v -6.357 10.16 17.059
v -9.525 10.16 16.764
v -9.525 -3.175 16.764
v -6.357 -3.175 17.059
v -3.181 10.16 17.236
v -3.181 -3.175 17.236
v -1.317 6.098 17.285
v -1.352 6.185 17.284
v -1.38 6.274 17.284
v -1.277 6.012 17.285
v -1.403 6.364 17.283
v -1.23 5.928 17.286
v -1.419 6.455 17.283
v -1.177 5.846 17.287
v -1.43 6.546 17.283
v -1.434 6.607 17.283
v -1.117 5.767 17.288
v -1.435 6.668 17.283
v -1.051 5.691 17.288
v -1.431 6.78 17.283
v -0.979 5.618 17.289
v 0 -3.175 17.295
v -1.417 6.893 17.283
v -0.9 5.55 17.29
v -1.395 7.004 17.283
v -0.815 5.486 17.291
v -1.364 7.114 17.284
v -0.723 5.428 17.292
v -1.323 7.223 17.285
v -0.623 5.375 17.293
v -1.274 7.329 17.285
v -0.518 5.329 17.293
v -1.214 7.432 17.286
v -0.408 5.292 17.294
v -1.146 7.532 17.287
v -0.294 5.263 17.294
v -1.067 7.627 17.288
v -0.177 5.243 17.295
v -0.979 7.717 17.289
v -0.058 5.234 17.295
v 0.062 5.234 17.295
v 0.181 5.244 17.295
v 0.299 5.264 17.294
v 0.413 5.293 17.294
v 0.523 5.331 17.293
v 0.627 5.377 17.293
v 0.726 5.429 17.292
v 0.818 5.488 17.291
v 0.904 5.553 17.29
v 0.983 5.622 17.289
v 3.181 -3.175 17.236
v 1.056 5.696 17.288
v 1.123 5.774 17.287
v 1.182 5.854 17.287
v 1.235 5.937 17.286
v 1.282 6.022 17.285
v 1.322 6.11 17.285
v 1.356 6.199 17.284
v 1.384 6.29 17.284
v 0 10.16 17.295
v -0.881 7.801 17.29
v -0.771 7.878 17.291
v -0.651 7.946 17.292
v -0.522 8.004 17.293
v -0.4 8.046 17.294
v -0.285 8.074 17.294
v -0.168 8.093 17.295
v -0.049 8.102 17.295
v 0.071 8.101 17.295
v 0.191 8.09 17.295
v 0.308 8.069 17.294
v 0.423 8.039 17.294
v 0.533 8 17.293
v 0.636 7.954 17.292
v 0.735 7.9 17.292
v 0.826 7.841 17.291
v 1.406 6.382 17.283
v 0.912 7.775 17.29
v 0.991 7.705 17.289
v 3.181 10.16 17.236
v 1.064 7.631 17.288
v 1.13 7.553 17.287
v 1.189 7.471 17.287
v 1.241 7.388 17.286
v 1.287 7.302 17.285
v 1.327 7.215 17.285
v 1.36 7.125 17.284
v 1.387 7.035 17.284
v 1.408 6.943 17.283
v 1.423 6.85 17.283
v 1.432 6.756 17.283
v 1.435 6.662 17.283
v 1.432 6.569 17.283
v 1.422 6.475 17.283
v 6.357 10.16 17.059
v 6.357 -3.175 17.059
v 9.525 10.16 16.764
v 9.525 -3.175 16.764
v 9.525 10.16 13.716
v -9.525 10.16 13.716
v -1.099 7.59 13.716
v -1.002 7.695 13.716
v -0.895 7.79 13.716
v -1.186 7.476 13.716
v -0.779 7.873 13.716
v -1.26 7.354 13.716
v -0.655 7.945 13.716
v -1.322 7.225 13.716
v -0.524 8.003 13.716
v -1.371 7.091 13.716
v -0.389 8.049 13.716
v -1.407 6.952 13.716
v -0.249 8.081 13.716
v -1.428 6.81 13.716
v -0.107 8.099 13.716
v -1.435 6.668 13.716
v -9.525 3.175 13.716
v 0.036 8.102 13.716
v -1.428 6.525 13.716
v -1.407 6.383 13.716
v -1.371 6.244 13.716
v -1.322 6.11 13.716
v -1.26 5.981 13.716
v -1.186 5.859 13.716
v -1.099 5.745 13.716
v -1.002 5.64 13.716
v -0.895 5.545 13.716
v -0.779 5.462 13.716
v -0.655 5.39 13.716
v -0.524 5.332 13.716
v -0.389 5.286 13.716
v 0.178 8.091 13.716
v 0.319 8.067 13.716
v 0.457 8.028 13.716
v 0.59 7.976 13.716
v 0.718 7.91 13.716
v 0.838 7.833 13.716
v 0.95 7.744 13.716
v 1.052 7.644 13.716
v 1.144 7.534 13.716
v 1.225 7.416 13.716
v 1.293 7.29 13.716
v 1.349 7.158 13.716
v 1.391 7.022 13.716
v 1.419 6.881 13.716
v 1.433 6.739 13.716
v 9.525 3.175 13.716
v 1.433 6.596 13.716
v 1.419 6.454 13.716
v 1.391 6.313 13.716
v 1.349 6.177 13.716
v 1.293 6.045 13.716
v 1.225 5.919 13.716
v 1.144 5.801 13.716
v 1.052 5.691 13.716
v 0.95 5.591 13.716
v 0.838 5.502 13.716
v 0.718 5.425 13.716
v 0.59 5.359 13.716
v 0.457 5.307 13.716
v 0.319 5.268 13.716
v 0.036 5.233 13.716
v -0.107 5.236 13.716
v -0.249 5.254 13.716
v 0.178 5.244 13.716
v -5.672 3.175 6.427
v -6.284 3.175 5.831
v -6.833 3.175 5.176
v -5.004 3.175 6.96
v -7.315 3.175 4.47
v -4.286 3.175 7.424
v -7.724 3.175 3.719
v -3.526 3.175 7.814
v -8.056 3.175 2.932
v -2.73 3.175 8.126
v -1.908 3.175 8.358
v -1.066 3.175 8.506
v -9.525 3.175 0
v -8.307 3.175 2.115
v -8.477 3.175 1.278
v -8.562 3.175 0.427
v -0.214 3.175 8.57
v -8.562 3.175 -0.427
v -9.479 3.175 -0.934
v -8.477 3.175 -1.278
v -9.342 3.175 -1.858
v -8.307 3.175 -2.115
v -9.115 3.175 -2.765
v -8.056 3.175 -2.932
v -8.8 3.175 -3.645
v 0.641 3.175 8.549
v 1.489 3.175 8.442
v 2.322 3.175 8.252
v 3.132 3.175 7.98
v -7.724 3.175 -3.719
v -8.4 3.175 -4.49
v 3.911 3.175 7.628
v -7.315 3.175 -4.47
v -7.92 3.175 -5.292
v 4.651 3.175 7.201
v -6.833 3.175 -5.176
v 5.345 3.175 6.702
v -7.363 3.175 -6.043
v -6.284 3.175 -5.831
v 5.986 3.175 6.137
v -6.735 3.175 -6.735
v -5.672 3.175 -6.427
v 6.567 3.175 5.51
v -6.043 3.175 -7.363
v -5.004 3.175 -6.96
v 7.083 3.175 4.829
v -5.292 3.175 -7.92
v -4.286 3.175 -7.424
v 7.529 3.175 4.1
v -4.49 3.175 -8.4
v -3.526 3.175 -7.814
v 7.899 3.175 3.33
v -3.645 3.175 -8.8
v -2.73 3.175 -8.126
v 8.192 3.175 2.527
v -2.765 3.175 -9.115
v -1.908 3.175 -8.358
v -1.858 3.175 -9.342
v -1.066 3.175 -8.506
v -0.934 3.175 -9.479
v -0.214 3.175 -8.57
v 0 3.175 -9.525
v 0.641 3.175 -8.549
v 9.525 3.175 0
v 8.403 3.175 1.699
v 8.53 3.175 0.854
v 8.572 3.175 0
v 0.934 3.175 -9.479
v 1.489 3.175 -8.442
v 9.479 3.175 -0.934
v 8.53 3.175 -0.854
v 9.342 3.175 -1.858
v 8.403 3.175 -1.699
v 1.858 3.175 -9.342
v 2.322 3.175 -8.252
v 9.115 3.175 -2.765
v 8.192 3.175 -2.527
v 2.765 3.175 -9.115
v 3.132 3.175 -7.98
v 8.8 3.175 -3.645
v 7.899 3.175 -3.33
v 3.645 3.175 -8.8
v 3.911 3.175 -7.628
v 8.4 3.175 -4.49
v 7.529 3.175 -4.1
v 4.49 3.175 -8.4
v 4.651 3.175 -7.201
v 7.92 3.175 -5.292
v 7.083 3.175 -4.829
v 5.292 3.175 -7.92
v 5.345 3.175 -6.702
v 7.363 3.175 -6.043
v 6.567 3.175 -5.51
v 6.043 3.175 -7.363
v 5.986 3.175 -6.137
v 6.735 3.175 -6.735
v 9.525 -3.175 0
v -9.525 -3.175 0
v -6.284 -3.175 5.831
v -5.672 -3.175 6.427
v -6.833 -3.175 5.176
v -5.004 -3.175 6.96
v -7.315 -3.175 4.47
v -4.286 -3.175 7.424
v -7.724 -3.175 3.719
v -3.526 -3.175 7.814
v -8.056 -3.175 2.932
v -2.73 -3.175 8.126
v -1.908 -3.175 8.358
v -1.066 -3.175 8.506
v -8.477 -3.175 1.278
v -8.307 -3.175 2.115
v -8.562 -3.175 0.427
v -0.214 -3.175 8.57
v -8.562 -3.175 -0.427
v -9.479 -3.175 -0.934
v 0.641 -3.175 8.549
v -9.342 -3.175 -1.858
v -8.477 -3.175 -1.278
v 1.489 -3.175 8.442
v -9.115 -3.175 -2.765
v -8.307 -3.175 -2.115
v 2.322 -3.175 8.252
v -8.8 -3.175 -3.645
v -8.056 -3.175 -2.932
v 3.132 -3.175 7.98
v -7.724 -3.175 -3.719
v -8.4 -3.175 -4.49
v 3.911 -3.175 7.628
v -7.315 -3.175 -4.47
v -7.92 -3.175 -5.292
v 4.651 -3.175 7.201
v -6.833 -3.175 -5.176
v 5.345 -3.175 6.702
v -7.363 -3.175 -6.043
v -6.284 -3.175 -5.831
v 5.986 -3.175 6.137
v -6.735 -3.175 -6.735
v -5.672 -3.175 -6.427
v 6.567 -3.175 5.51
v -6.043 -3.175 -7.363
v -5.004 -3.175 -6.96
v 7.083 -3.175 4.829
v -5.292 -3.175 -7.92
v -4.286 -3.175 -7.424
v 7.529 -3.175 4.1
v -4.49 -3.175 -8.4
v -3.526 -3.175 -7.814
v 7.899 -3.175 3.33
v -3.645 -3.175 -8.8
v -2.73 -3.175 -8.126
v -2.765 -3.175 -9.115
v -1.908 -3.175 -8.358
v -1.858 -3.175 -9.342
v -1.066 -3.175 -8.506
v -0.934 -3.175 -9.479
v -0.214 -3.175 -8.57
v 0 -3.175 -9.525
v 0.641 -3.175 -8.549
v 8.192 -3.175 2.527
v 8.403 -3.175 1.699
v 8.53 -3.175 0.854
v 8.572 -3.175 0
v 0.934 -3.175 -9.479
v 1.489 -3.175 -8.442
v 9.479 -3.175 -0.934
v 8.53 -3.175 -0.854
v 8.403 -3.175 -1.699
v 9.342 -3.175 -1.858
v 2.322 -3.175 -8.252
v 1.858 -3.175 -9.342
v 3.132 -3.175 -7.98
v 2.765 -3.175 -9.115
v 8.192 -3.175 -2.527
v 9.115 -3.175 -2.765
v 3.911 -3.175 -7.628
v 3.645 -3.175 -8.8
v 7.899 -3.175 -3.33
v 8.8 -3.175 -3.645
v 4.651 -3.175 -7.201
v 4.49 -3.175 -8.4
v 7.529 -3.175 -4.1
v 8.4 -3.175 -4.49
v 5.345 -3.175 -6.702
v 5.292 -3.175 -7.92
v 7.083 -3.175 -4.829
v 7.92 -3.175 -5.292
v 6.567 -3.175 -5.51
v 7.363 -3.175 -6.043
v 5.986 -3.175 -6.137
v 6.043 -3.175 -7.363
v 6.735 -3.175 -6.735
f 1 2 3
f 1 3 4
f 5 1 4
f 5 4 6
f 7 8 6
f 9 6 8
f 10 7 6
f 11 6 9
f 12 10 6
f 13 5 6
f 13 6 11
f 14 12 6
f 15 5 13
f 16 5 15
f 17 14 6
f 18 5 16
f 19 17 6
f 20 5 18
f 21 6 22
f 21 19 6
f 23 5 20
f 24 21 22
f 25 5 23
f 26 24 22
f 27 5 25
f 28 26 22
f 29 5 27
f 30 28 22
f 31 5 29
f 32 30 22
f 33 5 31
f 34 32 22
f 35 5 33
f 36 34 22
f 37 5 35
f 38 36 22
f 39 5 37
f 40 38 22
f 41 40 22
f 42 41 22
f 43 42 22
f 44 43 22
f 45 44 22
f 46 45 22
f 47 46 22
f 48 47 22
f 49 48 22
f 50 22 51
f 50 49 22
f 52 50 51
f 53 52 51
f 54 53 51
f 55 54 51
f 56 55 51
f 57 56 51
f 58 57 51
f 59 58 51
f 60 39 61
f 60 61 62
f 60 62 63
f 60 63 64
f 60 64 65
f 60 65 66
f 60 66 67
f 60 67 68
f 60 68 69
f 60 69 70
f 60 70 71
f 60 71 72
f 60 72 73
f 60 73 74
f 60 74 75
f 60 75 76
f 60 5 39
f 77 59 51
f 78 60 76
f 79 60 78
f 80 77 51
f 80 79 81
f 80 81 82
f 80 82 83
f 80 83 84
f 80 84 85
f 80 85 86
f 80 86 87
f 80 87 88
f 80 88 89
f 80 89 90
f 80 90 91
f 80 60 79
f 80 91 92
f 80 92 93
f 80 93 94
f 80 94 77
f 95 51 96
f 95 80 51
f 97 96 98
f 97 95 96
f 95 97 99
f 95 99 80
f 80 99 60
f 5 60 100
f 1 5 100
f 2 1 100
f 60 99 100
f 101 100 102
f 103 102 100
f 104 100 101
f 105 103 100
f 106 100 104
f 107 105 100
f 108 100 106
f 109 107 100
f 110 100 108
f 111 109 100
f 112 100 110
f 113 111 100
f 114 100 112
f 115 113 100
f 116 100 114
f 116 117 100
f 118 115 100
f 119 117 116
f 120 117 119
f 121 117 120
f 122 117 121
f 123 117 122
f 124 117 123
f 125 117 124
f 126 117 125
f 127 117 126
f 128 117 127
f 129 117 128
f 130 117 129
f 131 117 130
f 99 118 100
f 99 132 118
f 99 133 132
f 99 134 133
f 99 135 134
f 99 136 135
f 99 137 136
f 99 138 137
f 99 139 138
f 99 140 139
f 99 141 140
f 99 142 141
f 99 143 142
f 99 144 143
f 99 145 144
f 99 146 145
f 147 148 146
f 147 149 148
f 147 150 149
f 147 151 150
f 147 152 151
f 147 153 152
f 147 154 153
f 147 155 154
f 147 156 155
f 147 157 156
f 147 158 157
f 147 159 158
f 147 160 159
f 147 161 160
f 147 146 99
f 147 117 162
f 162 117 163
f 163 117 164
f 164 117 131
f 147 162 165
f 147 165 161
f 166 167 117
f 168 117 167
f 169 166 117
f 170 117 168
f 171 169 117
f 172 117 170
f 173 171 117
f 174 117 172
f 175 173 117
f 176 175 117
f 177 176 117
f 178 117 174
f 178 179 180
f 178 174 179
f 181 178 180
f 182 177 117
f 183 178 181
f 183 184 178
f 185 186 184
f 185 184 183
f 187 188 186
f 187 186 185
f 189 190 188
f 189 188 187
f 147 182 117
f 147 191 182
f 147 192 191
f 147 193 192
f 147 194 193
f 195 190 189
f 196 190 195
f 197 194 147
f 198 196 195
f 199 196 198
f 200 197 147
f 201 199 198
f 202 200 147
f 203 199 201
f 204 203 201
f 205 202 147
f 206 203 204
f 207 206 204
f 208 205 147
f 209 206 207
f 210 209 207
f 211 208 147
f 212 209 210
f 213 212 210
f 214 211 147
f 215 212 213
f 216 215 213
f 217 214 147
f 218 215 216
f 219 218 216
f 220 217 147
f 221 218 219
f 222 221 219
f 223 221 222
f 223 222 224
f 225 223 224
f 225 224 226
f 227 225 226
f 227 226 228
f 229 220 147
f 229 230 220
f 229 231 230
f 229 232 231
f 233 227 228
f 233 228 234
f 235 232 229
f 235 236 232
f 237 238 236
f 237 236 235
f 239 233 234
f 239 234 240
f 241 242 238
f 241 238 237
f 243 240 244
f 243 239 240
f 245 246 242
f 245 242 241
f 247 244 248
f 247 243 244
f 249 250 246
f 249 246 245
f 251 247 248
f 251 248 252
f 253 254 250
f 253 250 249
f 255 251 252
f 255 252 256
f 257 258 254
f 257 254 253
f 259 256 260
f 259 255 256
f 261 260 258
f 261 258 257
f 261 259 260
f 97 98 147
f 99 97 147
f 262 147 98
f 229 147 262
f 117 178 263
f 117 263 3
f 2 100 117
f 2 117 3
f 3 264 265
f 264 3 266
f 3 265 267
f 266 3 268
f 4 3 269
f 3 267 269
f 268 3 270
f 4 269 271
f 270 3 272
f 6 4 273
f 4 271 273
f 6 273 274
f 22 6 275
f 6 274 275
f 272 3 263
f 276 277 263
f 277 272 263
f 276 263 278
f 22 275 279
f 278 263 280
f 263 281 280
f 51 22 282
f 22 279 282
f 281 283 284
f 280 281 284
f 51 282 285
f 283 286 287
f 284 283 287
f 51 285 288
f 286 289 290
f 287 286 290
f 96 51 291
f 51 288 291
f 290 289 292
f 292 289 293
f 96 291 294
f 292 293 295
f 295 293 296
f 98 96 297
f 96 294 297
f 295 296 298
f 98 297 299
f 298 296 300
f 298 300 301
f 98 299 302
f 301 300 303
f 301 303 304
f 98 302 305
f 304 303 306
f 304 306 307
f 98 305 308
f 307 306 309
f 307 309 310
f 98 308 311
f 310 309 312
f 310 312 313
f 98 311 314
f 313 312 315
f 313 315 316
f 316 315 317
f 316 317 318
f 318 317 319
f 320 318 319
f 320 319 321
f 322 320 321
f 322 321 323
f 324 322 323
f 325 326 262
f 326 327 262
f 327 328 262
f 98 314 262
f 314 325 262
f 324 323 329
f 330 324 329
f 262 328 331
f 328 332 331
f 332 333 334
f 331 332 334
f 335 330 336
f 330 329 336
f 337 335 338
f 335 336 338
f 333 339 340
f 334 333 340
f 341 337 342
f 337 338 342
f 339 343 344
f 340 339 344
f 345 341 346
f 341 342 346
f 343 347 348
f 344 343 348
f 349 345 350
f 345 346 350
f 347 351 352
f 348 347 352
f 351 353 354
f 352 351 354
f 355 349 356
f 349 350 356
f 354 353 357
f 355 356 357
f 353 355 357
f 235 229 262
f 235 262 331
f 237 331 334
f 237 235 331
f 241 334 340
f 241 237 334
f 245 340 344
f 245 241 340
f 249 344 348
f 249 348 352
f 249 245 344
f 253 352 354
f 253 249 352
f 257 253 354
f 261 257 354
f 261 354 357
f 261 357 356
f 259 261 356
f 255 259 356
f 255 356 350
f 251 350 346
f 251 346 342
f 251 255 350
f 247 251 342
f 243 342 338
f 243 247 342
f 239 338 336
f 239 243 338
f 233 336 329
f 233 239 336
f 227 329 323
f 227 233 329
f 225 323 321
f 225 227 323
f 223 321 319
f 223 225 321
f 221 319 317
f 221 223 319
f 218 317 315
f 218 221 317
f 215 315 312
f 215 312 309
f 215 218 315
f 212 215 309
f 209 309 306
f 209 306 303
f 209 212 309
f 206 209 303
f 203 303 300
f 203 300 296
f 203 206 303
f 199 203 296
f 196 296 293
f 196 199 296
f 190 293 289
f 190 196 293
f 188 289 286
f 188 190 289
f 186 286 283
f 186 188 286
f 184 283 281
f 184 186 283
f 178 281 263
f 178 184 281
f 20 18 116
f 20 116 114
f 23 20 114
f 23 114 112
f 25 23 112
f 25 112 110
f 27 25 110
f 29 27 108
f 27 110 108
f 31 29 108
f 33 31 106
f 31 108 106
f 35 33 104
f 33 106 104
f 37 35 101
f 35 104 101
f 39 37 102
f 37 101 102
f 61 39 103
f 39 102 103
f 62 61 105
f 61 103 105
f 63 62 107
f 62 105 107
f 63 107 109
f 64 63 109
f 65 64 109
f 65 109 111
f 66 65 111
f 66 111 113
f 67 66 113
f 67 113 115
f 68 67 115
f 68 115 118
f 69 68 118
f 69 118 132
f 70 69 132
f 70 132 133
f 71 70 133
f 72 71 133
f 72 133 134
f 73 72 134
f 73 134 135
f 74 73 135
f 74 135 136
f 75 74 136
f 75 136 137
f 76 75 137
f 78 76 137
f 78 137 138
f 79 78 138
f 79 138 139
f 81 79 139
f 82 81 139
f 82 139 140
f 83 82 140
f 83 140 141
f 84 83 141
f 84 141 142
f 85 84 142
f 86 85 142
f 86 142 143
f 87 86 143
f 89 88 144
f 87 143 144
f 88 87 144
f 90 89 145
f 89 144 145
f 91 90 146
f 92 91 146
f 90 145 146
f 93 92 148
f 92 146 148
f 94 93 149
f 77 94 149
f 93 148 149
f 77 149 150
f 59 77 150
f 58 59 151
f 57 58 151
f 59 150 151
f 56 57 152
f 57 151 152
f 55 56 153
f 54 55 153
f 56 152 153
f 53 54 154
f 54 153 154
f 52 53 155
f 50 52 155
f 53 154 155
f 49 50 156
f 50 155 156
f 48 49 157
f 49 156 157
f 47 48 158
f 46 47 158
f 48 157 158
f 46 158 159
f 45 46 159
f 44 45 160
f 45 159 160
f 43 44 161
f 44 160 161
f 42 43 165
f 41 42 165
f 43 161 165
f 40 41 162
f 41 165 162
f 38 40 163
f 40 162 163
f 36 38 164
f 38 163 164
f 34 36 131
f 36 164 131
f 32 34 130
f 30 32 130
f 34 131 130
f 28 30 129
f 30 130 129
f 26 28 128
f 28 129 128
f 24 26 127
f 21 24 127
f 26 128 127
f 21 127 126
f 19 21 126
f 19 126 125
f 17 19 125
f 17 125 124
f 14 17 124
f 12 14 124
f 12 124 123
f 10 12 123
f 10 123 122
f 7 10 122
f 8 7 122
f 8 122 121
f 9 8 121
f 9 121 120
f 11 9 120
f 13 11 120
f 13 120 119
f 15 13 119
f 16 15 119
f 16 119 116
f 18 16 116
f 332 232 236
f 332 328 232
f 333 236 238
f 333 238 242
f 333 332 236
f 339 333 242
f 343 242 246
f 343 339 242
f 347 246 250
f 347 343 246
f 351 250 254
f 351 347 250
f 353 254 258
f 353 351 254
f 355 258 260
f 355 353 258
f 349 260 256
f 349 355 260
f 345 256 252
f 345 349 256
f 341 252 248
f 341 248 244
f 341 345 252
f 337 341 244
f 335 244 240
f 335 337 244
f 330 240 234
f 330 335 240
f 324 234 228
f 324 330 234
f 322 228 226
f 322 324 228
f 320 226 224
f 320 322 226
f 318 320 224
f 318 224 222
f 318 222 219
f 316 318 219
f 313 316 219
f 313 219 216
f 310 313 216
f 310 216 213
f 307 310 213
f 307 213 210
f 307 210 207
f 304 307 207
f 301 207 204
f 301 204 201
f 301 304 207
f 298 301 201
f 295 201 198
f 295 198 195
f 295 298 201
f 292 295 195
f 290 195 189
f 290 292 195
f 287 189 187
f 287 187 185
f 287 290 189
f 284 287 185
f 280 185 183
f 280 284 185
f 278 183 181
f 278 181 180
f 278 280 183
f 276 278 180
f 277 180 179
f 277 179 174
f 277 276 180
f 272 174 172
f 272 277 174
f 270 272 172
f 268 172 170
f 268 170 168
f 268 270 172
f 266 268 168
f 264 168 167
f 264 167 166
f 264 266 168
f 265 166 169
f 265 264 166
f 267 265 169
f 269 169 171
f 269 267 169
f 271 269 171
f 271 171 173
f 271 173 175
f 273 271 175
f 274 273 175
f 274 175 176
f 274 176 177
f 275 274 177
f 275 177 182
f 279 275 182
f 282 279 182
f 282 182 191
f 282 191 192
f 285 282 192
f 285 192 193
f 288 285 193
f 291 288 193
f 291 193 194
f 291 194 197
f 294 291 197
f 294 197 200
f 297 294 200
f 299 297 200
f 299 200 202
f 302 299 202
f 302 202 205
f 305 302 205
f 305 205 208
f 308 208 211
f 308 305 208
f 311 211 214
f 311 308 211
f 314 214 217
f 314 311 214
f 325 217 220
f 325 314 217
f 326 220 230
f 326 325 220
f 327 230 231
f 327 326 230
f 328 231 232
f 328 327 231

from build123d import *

# Parameters (mm, degrees)
SKETCH2_R           = 9.525
SKETCH2_R_2         = 8.5725
BOSS_EXTRUDE1_DEPTH = 3.175
BOSS_EXTRUDE2_DEPTH = 3.175
BOSS_EXTRUDE3_DEPTH = 10.16
SKETCH5_R           = 1.4351
CUT_EXTRUDE1_DEPTH  = 19.05


with BuildPart() as part:
    # Sketch2 → Boss-Extrude1 (new body, symmetric)
    with BuildSketch(Plane(origin=(0, 0, 0), x_dir=(1, 0, 0), z_dir=(0, 1, 0))):
        Circle(SKETCH2_R)
        Circle(SKETCH2_R_2, mode=Mode.SUBTRACT)
    extrude(amount=BOSS_EXTRUDE1_DEPTH, both=True)

    # Sketch3 → Boss-Extrude2 (add, symmetric)
    with BuildSketch(Plane(origin=(0, 0, 0), x_dir=(1, 0, 0), z_dir=(0, 1, 0))):
        with BuildLine():
            Line((-9.525, 0), (-9.525, -16.764))
            ThreePointArc((-9.525, -16.764), (0, -17.294810057), (9.525, -16.764))
            Line((9.525, -16.764), (9.525, 0))
            ThreePointArc((9.525, 0), (0, -9.525), (-9.525, 0))
        make_face()
    extrude(amount=BOSS_EXTRUDE2_DEPTH, both=True)

    # Sketch4 → Boss-Extrude3 (add)
    with BuildSketch(Plane(origin=(0, 0, 0), x_dir=(1, 0, 0), z_dir=(0, 1, 0))):
        with BuildLine():
            Line((-9.525, -16.764), (-9.525, -13.716))
            Line((-9.525, -13.716), (9.525, -13.716))
            Line((9.525, -13.716), (9.525, -16.764))
            ThreePointArc((9.525, -16.764), (0, -17.294810057), (-9.525, -16.764))
        make_face()
    extrude(amount=BOSS_EXTRUDE3_DEPTH)

    # Sketch5 → Cut-Extrude1 (cut)
    with BuildSketch(Plane(origin=(0, 0, 13.716), x_dir=(-1, 0, 0), z_dir=(0, 0, -1))):
        with Locations((0, 6.6675)):
            Circle(SKETCH5_R)
    extrude(amount=-CUT_EXTRUDE1_DEPTH, mode=Mode.SUBTRACT)


solid = part.part
